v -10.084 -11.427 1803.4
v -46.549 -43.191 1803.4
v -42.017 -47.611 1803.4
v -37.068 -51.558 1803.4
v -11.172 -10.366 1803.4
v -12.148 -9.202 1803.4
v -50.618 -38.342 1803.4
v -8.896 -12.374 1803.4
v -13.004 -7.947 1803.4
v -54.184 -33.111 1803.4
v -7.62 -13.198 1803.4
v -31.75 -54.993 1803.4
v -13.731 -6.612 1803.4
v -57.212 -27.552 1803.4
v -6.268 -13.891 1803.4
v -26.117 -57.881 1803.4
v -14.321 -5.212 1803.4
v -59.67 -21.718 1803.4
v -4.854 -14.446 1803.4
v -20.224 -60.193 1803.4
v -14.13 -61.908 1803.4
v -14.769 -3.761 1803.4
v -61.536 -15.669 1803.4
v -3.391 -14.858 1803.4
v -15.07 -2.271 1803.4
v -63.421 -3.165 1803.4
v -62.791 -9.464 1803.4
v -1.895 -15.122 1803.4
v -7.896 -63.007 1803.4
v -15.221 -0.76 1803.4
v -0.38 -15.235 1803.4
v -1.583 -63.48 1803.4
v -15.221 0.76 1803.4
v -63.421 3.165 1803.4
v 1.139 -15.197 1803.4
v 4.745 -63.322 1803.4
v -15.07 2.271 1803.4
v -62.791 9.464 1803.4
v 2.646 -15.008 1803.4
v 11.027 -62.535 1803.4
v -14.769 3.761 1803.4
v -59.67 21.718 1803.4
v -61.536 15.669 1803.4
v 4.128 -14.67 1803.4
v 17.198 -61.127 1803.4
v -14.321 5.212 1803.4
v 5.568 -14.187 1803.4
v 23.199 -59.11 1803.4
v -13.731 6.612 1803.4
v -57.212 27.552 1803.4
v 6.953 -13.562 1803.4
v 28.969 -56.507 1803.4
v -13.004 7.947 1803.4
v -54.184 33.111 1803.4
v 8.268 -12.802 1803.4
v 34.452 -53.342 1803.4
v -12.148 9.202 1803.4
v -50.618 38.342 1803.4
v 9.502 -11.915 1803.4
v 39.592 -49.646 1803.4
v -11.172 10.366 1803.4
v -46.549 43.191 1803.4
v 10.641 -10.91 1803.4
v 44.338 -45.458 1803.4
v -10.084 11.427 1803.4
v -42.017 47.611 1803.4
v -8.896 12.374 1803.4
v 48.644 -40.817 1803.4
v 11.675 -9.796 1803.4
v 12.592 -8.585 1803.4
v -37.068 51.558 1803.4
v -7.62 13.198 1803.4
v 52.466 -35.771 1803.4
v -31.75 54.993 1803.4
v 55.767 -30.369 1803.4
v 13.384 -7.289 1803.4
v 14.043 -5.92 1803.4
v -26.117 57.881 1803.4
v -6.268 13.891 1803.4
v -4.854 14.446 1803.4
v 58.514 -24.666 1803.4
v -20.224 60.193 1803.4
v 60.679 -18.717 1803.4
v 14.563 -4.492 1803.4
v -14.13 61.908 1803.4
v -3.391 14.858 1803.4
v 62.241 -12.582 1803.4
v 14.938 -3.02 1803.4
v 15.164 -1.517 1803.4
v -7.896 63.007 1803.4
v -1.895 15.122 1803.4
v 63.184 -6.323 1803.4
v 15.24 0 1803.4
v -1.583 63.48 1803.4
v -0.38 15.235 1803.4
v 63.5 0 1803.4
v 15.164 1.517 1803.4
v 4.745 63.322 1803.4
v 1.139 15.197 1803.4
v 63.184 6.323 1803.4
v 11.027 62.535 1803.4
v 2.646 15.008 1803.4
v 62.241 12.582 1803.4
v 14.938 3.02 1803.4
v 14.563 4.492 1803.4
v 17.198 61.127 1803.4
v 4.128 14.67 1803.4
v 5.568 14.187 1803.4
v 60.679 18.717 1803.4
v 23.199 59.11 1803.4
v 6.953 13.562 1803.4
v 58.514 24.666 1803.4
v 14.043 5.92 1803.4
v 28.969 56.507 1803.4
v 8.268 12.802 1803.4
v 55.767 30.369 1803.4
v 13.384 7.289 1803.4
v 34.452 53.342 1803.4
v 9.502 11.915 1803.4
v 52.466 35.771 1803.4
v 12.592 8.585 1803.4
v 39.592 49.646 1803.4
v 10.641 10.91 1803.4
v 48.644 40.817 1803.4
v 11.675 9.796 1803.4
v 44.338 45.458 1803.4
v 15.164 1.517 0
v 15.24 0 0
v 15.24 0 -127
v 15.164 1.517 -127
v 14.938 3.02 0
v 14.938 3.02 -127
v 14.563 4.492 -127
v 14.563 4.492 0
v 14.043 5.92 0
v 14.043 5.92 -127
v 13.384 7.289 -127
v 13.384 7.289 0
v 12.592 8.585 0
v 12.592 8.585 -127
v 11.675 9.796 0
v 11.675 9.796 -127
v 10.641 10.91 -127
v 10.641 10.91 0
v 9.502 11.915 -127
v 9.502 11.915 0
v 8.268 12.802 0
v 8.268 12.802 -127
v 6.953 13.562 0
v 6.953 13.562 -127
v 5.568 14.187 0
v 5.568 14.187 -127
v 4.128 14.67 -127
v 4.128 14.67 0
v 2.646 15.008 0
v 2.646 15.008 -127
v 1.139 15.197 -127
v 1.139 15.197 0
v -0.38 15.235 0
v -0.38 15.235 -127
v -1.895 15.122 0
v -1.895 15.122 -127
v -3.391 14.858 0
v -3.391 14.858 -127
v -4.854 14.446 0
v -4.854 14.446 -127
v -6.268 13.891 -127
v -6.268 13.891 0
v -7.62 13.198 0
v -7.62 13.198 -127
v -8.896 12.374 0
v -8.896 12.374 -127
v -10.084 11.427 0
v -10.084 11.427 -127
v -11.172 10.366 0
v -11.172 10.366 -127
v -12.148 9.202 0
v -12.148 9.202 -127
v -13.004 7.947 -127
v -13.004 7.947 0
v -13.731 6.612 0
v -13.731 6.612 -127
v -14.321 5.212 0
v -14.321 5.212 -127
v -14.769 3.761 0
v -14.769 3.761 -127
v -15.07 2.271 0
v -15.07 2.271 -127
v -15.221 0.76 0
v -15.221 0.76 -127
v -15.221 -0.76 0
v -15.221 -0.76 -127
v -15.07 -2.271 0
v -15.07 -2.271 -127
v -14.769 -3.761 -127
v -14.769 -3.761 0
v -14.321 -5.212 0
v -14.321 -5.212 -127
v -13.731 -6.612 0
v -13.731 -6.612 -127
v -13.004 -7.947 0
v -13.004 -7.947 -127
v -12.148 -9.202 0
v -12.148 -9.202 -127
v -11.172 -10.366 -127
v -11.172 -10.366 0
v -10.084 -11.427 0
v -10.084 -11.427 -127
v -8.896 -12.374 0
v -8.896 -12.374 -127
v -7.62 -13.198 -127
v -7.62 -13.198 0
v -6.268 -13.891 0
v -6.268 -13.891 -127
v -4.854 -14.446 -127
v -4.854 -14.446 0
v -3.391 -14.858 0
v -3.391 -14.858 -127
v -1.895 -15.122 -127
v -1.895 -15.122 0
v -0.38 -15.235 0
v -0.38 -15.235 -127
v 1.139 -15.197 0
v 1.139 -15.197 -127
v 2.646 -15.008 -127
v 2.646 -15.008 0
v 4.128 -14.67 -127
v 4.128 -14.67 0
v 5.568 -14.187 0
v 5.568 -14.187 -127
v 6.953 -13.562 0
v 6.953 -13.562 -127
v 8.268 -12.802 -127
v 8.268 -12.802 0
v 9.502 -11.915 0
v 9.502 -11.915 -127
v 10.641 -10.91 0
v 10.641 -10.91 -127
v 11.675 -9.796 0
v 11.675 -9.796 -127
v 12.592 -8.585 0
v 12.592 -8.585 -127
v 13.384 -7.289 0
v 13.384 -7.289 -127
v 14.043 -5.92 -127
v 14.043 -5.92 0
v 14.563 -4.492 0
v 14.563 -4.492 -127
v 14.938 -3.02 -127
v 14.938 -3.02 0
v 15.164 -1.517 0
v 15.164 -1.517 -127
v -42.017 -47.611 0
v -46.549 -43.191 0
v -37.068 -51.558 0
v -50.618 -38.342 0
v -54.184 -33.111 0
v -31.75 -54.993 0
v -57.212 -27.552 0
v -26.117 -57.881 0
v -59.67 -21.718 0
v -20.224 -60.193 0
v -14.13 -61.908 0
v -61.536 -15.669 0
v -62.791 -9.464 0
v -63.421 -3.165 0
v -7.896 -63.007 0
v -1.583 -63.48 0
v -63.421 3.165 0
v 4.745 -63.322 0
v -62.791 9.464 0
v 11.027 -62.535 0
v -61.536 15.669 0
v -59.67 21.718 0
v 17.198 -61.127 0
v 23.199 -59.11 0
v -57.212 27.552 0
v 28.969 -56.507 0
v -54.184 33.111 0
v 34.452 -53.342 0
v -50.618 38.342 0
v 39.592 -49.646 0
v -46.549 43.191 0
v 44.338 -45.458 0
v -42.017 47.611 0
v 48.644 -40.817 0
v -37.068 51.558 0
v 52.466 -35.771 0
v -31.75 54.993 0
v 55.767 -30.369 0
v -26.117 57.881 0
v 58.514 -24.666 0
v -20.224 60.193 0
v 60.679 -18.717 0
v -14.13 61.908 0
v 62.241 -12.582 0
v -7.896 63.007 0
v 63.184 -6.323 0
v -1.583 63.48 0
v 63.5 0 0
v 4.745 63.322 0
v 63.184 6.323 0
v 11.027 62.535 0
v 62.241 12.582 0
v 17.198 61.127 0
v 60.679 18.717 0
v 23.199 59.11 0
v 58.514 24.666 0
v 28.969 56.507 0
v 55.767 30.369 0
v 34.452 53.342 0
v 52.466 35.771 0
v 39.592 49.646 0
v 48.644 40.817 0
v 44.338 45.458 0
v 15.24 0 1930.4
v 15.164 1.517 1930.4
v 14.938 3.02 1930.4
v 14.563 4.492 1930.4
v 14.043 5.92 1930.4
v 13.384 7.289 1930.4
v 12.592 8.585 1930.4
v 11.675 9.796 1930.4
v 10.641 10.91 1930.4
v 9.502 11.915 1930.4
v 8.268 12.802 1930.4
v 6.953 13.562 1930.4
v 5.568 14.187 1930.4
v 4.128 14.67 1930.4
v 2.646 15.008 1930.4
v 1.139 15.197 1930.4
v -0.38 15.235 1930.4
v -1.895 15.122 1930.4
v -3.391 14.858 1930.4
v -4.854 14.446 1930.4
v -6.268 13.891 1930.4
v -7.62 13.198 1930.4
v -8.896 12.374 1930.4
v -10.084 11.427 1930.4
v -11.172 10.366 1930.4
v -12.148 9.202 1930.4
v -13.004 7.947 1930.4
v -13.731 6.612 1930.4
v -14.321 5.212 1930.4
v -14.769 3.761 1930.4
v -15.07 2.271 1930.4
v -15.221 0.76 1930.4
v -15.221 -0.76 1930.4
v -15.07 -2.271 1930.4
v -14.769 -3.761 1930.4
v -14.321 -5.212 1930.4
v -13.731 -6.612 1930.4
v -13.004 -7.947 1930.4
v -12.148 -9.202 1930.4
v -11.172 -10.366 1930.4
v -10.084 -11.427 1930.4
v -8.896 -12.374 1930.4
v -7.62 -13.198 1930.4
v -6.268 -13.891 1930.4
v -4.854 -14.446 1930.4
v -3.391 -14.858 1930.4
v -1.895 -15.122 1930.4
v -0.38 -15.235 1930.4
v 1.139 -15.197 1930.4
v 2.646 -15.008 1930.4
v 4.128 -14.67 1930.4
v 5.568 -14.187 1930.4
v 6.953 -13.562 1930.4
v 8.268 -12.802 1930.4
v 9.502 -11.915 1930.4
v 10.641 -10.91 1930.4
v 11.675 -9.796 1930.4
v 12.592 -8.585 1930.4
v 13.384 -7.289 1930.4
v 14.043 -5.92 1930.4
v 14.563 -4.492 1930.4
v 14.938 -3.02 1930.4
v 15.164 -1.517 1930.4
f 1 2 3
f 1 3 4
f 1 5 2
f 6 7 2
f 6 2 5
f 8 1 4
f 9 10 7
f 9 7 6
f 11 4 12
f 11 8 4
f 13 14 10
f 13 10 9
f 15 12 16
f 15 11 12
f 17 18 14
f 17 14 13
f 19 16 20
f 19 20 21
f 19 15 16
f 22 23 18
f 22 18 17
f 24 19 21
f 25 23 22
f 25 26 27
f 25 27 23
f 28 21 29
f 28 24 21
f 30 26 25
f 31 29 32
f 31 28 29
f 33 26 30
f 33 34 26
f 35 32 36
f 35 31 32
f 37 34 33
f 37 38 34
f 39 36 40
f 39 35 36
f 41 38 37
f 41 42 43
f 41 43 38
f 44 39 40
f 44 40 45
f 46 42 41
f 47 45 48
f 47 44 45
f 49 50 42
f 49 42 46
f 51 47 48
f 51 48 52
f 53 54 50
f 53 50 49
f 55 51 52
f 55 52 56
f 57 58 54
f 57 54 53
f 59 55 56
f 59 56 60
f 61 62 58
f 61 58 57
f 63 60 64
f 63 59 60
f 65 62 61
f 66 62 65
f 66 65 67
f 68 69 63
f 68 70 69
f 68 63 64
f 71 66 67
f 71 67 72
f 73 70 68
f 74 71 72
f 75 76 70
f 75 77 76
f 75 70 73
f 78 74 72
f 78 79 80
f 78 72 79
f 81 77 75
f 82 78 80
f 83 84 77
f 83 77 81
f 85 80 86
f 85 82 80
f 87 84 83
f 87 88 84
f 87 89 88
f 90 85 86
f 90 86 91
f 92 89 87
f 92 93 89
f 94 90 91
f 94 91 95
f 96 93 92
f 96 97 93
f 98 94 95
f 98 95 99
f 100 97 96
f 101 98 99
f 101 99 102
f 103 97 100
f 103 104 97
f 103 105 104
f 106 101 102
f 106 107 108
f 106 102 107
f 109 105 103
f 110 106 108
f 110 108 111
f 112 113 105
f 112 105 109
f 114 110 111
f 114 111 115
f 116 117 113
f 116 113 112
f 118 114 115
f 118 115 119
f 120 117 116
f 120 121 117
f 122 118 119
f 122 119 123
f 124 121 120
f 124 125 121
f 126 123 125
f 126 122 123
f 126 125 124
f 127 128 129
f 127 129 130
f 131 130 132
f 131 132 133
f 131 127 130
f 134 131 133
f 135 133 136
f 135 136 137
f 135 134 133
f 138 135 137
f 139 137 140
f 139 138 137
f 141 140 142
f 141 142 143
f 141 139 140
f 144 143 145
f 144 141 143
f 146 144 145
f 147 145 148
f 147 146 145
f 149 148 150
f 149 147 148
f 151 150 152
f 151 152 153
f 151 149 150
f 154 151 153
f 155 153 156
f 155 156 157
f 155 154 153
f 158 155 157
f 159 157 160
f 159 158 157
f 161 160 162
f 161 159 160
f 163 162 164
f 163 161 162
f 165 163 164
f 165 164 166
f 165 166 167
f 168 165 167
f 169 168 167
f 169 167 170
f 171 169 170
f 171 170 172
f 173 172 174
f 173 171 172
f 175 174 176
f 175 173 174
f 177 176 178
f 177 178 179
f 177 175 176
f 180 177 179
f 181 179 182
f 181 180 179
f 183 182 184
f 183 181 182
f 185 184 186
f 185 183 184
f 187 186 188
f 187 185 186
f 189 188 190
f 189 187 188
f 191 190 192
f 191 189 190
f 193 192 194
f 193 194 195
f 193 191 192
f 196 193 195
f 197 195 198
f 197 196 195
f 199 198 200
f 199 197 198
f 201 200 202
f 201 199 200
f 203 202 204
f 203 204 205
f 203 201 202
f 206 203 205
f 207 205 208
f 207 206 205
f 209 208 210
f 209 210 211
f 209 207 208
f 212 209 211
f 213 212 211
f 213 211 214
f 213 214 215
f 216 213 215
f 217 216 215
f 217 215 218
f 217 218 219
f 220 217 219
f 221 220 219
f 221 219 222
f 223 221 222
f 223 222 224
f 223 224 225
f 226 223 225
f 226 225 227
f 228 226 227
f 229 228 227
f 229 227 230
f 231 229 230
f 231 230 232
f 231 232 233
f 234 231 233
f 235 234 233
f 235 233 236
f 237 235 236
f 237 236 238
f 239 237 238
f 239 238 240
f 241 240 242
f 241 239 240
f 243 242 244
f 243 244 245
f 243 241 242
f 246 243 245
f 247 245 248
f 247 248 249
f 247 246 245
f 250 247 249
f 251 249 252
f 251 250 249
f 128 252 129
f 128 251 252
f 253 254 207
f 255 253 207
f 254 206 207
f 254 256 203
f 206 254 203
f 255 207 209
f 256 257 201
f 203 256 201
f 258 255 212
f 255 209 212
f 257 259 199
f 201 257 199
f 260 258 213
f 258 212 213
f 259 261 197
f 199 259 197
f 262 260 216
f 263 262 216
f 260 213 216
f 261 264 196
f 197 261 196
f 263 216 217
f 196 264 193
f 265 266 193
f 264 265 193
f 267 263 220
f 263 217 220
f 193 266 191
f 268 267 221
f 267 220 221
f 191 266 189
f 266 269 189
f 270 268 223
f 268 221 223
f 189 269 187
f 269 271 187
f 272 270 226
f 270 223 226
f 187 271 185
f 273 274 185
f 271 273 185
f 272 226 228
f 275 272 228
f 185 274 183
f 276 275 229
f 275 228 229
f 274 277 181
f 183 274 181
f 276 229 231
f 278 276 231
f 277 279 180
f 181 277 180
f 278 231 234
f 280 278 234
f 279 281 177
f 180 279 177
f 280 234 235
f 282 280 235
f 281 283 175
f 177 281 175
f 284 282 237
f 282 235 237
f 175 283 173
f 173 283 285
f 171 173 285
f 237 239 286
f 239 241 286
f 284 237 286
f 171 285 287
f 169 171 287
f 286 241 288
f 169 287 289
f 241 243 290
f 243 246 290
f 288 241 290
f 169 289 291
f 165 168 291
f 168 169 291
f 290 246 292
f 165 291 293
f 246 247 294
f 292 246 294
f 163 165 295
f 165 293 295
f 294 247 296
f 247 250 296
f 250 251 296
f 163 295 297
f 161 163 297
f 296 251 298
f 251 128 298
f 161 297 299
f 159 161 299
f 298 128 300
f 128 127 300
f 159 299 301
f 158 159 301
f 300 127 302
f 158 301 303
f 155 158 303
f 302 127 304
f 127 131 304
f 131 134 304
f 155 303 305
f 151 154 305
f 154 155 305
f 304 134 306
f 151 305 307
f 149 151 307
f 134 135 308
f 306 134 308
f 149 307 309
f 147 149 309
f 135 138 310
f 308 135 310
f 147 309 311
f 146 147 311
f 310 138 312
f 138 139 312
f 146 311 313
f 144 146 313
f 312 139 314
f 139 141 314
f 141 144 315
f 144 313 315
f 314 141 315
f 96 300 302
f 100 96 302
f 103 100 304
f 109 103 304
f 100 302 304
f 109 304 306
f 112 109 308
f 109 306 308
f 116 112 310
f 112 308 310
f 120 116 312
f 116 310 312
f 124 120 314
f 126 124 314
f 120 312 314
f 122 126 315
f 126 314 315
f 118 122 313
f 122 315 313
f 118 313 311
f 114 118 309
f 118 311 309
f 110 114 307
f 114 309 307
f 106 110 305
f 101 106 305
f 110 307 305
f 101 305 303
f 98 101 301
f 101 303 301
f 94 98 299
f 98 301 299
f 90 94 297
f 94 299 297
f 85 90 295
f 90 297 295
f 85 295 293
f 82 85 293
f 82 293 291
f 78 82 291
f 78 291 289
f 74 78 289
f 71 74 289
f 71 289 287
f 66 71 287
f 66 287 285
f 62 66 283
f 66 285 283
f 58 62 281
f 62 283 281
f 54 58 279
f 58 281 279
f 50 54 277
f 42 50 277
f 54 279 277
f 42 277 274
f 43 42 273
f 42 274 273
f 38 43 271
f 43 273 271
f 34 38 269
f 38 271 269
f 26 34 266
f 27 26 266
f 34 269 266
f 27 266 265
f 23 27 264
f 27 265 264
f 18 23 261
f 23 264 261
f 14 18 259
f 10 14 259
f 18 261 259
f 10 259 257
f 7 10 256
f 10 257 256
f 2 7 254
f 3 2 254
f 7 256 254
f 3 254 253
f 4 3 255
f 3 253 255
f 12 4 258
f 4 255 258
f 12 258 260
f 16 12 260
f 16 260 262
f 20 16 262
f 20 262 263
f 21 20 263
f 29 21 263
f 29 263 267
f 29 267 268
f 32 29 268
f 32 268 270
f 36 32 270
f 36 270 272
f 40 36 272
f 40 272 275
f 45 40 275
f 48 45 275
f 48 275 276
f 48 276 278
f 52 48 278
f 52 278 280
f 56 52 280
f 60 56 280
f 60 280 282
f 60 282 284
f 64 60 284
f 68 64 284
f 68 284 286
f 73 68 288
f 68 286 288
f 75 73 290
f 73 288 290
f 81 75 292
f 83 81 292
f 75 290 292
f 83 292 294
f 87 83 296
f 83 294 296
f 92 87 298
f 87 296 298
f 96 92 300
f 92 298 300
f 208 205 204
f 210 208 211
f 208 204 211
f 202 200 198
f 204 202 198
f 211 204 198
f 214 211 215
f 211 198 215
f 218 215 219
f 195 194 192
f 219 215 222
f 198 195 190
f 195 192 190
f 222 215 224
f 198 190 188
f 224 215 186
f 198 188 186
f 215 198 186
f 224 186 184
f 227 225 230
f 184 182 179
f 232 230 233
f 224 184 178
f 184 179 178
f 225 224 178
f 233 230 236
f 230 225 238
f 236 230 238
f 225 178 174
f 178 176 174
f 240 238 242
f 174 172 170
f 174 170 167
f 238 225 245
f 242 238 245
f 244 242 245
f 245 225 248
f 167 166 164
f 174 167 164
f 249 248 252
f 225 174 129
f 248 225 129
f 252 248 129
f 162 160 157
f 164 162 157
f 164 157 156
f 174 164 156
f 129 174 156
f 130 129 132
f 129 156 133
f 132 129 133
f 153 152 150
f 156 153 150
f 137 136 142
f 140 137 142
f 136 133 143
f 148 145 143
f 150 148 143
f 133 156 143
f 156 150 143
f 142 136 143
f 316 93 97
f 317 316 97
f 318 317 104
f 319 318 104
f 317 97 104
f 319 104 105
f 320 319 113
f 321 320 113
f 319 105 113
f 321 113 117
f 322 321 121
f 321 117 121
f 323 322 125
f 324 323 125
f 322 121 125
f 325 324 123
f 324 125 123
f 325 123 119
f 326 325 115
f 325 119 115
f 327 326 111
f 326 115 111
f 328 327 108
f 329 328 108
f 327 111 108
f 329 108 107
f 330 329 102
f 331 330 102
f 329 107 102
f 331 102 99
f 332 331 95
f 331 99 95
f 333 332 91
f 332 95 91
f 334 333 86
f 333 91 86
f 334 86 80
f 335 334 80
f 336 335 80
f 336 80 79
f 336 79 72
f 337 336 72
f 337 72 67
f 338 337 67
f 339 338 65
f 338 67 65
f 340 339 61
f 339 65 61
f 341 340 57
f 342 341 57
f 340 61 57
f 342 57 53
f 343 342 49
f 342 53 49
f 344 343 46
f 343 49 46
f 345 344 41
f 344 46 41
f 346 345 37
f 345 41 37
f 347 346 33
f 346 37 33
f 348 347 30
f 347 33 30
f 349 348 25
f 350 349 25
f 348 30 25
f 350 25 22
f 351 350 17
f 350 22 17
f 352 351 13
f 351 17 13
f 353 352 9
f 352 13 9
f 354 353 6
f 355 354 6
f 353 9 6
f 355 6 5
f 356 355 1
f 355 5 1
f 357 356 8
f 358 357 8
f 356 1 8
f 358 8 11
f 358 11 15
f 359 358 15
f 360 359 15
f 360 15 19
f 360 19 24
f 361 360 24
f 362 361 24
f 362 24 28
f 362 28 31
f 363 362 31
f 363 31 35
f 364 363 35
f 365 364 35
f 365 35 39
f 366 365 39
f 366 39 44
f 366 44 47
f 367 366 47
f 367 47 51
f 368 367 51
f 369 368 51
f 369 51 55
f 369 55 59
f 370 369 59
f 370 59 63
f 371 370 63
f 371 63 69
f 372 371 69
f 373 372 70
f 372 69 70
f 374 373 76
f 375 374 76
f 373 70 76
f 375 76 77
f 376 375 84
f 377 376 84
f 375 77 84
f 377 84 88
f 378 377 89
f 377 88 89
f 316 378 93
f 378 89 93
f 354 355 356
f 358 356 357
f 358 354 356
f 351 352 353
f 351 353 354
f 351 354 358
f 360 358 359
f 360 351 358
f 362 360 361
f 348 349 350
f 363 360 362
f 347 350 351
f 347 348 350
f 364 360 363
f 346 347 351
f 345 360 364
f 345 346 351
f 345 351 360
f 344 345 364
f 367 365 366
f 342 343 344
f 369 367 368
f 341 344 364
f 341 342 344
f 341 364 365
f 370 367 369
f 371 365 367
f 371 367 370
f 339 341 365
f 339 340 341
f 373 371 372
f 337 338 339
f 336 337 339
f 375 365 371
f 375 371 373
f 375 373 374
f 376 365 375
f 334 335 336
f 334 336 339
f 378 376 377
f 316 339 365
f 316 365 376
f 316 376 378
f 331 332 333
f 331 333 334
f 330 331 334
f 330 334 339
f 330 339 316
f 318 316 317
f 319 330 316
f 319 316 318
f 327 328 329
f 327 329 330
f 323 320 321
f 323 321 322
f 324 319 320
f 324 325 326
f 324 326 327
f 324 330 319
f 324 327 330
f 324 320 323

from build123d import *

# Parameters (mm, degrees)
F0_R     = 63.5
F1_DEPTH = 1803.4
F3_R     = 15.24
F4_DEPTH = 127
F5_R     = 15.24
F6_DEPTH = 127


with BuildPart() as f1:
    # F0 (on Top) → F1 (new body)
    with BuildSketch(Plane.XY):
        Circle(F0_R)
    extrude(amount=F1_DEPTH)

    # F3 (on offset) → F4 (join)
    with BuildSketch(Plane.XY.offset(1803.4)):
        Circle(F3_R)
    extrude(amount=F4_DEPTH)

    # F5 (on Top) → F6 (join)
    with BuildSketch(Plane.XY):
        Circle(F5_R)
    extrude(amount=-F6_DEPTH)


solid = f1.part
